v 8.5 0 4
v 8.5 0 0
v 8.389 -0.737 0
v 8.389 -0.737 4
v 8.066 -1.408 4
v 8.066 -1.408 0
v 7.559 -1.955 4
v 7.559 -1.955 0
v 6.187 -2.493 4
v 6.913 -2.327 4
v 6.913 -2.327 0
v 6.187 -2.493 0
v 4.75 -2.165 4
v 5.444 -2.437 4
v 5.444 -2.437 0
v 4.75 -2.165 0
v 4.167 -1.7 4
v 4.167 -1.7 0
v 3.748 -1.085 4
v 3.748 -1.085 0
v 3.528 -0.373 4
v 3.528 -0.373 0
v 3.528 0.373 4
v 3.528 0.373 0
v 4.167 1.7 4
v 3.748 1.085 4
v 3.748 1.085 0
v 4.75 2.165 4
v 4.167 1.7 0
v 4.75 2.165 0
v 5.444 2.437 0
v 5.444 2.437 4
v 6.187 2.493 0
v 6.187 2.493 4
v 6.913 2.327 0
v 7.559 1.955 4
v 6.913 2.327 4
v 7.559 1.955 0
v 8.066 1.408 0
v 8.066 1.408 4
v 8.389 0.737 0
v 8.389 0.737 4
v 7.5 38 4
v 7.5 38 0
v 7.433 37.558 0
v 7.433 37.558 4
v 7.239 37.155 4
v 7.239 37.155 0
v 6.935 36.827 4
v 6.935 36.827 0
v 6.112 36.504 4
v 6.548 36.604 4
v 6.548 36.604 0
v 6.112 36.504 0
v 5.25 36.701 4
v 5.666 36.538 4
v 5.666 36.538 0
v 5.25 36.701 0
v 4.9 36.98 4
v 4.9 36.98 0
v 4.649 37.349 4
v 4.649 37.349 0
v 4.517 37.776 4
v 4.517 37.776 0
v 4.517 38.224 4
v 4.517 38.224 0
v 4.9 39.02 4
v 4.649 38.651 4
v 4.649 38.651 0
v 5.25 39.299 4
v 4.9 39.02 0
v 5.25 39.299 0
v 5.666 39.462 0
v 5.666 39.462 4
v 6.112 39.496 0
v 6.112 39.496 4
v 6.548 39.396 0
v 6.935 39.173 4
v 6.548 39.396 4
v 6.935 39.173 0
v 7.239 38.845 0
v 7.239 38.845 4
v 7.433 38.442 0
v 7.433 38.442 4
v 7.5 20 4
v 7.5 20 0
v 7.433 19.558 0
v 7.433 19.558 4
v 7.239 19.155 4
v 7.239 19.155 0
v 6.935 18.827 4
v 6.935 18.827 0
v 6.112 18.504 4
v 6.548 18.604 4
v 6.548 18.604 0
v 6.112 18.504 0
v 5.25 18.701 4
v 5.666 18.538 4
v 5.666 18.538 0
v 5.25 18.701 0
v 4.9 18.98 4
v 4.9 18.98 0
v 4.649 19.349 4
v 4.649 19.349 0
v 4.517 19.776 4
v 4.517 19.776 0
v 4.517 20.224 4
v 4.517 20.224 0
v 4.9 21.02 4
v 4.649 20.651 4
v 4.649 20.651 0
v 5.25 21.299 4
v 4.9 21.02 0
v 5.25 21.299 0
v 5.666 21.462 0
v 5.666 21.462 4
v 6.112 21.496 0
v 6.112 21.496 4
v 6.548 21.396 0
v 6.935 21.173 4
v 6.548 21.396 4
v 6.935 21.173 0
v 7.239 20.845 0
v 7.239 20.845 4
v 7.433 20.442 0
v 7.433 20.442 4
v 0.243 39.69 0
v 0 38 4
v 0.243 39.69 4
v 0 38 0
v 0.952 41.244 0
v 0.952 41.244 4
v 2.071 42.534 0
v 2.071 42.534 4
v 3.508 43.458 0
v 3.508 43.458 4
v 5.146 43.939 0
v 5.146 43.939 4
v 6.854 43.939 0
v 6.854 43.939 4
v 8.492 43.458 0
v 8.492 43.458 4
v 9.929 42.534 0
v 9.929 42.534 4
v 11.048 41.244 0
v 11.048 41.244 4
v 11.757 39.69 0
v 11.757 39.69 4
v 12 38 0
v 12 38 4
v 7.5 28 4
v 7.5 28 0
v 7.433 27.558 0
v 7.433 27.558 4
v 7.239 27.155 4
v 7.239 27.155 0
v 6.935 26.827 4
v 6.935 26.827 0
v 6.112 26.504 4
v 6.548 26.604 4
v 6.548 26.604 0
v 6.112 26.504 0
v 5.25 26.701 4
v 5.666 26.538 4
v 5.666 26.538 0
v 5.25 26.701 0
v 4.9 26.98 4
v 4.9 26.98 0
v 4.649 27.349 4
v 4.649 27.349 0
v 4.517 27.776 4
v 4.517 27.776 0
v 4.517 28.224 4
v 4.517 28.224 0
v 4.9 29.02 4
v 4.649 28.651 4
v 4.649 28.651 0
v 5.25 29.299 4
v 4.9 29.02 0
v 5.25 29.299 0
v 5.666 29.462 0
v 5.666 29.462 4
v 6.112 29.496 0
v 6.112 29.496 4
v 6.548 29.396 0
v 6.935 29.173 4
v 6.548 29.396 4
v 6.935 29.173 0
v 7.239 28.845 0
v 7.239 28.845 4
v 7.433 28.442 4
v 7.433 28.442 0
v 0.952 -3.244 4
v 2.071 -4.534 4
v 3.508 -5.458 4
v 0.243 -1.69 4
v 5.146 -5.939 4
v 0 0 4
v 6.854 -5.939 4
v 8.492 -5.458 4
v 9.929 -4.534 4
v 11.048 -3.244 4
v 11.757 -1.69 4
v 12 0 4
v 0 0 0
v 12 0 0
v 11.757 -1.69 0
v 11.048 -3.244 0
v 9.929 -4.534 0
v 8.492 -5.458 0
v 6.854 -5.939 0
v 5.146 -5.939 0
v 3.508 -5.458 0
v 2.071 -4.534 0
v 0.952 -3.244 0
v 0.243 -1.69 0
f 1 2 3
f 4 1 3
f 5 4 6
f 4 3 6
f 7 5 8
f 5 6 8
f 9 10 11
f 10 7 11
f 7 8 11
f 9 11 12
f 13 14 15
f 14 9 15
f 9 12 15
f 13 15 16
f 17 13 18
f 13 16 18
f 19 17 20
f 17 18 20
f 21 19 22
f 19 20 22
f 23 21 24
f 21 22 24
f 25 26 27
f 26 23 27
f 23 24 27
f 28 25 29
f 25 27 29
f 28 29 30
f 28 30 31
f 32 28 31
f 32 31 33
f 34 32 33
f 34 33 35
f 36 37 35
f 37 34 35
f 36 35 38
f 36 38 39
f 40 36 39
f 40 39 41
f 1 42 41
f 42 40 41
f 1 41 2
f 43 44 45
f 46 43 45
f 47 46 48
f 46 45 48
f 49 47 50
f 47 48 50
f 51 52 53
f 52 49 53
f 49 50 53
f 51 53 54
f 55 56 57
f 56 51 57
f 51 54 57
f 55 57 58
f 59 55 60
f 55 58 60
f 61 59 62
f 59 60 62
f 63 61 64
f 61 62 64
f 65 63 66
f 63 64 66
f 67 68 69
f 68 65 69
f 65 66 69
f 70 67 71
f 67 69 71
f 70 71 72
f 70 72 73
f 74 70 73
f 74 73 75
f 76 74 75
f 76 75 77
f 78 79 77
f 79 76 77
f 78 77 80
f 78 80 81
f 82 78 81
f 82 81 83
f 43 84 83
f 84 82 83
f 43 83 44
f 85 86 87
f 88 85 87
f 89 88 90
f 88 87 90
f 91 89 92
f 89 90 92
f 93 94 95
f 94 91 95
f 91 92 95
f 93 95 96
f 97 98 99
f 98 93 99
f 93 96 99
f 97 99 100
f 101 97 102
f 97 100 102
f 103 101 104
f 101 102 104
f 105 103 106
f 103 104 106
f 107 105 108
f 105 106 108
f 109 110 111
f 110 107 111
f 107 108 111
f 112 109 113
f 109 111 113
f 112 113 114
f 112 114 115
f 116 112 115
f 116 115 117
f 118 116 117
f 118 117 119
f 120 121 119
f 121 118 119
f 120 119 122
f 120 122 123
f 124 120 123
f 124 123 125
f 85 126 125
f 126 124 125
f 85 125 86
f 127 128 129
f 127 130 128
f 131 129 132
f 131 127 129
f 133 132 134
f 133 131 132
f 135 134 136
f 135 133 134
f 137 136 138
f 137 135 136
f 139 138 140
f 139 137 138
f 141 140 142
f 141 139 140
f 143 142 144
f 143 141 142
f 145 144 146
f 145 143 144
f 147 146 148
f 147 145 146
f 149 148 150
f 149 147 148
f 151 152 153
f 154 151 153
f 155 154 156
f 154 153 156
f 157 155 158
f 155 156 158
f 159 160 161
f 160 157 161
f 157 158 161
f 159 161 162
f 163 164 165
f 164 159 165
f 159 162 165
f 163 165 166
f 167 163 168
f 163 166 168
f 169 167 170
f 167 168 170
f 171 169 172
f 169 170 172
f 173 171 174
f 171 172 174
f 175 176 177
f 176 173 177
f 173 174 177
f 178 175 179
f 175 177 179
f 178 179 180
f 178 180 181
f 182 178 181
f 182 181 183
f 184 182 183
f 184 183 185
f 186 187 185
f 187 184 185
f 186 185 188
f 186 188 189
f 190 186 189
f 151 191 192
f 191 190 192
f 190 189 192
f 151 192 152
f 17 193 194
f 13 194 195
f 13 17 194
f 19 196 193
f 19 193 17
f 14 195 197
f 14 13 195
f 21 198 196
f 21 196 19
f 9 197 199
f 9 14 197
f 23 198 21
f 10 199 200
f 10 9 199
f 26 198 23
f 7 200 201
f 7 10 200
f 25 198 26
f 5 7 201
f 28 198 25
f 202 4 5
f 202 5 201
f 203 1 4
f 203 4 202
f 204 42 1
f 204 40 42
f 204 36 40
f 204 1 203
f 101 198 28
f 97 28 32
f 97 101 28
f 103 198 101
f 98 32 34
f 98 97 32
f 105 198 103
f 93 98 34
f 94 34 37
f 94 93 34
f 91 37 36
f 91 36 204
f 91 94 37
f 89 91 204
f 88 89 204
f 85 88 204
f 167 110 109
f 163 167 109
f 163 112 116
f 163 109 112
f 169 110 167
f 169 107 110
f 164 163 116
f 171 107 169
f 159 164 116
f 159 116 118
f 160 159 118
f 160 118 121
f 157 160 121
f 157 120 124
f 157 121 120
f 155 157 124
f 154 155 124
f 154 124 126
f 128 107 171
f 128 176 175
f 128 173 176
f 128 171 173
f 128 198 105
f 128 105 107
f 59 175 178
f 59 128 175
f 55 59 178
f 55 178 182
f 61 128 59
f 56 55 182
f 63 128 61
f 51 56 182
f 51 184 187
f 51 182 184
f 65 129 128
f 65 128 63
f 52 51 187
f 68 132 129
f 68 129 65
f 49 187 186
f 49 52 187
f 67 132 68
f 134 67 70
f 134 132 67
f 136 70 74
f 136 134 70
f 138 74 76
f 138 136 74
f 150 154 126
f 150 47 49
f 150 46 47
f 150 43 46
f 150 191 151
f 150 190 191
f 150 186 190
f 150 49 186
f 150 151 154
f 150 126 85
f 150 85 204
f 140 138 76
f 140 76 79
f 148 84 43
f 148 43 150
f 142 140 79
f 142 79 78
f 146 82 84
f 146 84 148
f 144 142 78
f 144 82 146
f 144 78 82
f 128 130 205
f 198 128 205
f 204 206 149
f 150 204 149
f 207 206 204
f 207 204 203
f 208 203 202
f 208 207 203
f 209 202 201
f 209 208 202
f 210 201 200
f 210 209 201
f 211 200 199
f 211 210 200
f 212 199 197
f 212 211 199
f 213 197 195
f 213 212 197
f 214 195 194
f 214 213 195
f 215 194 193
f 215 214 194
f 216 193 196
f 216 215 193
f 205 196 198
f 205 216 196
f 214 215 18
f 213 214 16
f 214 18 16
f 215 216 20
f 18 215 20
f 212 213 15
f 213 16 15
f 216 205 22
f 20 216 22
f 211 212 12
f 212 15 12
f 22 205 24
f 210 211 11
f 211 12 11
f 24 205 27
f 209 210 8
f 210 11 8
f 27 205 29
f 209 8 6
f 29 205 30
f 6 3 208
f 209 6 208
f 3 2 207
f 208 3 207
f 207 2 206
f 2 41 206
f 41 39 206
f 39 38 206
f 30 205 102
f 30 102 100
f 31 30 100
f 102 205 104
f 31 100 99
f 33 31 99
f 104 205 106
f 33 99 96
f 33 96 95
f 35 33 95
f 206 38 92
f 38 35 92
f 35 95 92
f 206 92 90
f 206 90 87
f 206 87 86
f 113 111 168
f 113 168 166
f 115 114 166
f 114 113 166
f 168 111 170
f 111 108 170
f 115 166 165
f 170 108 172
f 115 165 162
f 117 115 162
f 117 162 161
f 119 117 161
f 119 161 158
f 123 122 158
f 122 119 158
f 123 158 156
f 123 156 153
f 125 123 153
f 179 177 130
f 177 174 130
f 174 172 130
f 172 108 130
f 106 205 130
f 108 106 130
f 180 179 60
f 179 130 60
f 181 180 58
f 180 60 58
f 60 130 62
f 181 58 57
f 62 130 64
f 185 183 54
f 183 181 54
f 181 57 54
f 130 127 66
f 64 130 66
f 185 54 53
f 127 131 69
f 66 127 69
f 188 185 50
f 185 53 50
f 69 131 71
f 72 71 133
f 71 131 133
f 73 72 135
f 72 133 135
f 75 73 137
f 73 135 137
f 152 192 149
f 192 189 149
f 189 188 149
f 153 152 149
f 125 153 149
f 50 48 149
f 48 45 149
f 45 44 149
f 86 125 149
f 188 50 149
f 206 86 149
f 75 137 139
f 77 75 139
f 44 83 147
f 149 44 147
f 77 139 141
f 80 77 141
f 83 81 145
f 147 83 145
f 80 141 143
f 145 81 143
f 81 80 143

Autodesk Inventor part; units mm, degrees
ref_plane "YZ Plane" through (0, 0, 0) normal (1, 0, 0) x (0, 1, 0)
ref_plane "XZ Plane" through (0, 0, 0) normal (0, 1, 0) x (-1, 0, 0)
ref_plane "XY Plane" through (0, 0, 0) normal (0, 0, 1) x (1, 0, 0)
sketch "Sketch1" plane through (0, 0, 0) normal (0, 0, 1) x (1, 0, 0)
  line L0 (0, 0) -> (12, 0) construction
  line L1 (12, 0) -> (12, 38)
  line L2 (12, 38) -> (0, 38) construction
  line L3 (0, 38) -> (0, 0)
  arc A0 (12, 38) -> (0, 38) centre (6, 38) ccw
  arc A1 (0, 0) -> (12, 0) centre (6, 0) ccw
  circle A2 centre (6, 38) radius 1.5
  circle A3 centre (6, 0) radius 2.5
  circle A4 centre (6, 20) radius 1.5
  circle A5 centre (6, 28) radius 1.5
  dimension "d0" = 12
  dimension "d1" = 38
  dimension "d2" = 3
  dimension "d3" = 5
  dimension "d6" = 3
  dimension "d7" = 20
  dimension "d8" = 3
  dimension "d9" = 10
extrude "Extrusion1" add sketch "Sketch1" along normal blind 4
properties part number "z axis arm2"
